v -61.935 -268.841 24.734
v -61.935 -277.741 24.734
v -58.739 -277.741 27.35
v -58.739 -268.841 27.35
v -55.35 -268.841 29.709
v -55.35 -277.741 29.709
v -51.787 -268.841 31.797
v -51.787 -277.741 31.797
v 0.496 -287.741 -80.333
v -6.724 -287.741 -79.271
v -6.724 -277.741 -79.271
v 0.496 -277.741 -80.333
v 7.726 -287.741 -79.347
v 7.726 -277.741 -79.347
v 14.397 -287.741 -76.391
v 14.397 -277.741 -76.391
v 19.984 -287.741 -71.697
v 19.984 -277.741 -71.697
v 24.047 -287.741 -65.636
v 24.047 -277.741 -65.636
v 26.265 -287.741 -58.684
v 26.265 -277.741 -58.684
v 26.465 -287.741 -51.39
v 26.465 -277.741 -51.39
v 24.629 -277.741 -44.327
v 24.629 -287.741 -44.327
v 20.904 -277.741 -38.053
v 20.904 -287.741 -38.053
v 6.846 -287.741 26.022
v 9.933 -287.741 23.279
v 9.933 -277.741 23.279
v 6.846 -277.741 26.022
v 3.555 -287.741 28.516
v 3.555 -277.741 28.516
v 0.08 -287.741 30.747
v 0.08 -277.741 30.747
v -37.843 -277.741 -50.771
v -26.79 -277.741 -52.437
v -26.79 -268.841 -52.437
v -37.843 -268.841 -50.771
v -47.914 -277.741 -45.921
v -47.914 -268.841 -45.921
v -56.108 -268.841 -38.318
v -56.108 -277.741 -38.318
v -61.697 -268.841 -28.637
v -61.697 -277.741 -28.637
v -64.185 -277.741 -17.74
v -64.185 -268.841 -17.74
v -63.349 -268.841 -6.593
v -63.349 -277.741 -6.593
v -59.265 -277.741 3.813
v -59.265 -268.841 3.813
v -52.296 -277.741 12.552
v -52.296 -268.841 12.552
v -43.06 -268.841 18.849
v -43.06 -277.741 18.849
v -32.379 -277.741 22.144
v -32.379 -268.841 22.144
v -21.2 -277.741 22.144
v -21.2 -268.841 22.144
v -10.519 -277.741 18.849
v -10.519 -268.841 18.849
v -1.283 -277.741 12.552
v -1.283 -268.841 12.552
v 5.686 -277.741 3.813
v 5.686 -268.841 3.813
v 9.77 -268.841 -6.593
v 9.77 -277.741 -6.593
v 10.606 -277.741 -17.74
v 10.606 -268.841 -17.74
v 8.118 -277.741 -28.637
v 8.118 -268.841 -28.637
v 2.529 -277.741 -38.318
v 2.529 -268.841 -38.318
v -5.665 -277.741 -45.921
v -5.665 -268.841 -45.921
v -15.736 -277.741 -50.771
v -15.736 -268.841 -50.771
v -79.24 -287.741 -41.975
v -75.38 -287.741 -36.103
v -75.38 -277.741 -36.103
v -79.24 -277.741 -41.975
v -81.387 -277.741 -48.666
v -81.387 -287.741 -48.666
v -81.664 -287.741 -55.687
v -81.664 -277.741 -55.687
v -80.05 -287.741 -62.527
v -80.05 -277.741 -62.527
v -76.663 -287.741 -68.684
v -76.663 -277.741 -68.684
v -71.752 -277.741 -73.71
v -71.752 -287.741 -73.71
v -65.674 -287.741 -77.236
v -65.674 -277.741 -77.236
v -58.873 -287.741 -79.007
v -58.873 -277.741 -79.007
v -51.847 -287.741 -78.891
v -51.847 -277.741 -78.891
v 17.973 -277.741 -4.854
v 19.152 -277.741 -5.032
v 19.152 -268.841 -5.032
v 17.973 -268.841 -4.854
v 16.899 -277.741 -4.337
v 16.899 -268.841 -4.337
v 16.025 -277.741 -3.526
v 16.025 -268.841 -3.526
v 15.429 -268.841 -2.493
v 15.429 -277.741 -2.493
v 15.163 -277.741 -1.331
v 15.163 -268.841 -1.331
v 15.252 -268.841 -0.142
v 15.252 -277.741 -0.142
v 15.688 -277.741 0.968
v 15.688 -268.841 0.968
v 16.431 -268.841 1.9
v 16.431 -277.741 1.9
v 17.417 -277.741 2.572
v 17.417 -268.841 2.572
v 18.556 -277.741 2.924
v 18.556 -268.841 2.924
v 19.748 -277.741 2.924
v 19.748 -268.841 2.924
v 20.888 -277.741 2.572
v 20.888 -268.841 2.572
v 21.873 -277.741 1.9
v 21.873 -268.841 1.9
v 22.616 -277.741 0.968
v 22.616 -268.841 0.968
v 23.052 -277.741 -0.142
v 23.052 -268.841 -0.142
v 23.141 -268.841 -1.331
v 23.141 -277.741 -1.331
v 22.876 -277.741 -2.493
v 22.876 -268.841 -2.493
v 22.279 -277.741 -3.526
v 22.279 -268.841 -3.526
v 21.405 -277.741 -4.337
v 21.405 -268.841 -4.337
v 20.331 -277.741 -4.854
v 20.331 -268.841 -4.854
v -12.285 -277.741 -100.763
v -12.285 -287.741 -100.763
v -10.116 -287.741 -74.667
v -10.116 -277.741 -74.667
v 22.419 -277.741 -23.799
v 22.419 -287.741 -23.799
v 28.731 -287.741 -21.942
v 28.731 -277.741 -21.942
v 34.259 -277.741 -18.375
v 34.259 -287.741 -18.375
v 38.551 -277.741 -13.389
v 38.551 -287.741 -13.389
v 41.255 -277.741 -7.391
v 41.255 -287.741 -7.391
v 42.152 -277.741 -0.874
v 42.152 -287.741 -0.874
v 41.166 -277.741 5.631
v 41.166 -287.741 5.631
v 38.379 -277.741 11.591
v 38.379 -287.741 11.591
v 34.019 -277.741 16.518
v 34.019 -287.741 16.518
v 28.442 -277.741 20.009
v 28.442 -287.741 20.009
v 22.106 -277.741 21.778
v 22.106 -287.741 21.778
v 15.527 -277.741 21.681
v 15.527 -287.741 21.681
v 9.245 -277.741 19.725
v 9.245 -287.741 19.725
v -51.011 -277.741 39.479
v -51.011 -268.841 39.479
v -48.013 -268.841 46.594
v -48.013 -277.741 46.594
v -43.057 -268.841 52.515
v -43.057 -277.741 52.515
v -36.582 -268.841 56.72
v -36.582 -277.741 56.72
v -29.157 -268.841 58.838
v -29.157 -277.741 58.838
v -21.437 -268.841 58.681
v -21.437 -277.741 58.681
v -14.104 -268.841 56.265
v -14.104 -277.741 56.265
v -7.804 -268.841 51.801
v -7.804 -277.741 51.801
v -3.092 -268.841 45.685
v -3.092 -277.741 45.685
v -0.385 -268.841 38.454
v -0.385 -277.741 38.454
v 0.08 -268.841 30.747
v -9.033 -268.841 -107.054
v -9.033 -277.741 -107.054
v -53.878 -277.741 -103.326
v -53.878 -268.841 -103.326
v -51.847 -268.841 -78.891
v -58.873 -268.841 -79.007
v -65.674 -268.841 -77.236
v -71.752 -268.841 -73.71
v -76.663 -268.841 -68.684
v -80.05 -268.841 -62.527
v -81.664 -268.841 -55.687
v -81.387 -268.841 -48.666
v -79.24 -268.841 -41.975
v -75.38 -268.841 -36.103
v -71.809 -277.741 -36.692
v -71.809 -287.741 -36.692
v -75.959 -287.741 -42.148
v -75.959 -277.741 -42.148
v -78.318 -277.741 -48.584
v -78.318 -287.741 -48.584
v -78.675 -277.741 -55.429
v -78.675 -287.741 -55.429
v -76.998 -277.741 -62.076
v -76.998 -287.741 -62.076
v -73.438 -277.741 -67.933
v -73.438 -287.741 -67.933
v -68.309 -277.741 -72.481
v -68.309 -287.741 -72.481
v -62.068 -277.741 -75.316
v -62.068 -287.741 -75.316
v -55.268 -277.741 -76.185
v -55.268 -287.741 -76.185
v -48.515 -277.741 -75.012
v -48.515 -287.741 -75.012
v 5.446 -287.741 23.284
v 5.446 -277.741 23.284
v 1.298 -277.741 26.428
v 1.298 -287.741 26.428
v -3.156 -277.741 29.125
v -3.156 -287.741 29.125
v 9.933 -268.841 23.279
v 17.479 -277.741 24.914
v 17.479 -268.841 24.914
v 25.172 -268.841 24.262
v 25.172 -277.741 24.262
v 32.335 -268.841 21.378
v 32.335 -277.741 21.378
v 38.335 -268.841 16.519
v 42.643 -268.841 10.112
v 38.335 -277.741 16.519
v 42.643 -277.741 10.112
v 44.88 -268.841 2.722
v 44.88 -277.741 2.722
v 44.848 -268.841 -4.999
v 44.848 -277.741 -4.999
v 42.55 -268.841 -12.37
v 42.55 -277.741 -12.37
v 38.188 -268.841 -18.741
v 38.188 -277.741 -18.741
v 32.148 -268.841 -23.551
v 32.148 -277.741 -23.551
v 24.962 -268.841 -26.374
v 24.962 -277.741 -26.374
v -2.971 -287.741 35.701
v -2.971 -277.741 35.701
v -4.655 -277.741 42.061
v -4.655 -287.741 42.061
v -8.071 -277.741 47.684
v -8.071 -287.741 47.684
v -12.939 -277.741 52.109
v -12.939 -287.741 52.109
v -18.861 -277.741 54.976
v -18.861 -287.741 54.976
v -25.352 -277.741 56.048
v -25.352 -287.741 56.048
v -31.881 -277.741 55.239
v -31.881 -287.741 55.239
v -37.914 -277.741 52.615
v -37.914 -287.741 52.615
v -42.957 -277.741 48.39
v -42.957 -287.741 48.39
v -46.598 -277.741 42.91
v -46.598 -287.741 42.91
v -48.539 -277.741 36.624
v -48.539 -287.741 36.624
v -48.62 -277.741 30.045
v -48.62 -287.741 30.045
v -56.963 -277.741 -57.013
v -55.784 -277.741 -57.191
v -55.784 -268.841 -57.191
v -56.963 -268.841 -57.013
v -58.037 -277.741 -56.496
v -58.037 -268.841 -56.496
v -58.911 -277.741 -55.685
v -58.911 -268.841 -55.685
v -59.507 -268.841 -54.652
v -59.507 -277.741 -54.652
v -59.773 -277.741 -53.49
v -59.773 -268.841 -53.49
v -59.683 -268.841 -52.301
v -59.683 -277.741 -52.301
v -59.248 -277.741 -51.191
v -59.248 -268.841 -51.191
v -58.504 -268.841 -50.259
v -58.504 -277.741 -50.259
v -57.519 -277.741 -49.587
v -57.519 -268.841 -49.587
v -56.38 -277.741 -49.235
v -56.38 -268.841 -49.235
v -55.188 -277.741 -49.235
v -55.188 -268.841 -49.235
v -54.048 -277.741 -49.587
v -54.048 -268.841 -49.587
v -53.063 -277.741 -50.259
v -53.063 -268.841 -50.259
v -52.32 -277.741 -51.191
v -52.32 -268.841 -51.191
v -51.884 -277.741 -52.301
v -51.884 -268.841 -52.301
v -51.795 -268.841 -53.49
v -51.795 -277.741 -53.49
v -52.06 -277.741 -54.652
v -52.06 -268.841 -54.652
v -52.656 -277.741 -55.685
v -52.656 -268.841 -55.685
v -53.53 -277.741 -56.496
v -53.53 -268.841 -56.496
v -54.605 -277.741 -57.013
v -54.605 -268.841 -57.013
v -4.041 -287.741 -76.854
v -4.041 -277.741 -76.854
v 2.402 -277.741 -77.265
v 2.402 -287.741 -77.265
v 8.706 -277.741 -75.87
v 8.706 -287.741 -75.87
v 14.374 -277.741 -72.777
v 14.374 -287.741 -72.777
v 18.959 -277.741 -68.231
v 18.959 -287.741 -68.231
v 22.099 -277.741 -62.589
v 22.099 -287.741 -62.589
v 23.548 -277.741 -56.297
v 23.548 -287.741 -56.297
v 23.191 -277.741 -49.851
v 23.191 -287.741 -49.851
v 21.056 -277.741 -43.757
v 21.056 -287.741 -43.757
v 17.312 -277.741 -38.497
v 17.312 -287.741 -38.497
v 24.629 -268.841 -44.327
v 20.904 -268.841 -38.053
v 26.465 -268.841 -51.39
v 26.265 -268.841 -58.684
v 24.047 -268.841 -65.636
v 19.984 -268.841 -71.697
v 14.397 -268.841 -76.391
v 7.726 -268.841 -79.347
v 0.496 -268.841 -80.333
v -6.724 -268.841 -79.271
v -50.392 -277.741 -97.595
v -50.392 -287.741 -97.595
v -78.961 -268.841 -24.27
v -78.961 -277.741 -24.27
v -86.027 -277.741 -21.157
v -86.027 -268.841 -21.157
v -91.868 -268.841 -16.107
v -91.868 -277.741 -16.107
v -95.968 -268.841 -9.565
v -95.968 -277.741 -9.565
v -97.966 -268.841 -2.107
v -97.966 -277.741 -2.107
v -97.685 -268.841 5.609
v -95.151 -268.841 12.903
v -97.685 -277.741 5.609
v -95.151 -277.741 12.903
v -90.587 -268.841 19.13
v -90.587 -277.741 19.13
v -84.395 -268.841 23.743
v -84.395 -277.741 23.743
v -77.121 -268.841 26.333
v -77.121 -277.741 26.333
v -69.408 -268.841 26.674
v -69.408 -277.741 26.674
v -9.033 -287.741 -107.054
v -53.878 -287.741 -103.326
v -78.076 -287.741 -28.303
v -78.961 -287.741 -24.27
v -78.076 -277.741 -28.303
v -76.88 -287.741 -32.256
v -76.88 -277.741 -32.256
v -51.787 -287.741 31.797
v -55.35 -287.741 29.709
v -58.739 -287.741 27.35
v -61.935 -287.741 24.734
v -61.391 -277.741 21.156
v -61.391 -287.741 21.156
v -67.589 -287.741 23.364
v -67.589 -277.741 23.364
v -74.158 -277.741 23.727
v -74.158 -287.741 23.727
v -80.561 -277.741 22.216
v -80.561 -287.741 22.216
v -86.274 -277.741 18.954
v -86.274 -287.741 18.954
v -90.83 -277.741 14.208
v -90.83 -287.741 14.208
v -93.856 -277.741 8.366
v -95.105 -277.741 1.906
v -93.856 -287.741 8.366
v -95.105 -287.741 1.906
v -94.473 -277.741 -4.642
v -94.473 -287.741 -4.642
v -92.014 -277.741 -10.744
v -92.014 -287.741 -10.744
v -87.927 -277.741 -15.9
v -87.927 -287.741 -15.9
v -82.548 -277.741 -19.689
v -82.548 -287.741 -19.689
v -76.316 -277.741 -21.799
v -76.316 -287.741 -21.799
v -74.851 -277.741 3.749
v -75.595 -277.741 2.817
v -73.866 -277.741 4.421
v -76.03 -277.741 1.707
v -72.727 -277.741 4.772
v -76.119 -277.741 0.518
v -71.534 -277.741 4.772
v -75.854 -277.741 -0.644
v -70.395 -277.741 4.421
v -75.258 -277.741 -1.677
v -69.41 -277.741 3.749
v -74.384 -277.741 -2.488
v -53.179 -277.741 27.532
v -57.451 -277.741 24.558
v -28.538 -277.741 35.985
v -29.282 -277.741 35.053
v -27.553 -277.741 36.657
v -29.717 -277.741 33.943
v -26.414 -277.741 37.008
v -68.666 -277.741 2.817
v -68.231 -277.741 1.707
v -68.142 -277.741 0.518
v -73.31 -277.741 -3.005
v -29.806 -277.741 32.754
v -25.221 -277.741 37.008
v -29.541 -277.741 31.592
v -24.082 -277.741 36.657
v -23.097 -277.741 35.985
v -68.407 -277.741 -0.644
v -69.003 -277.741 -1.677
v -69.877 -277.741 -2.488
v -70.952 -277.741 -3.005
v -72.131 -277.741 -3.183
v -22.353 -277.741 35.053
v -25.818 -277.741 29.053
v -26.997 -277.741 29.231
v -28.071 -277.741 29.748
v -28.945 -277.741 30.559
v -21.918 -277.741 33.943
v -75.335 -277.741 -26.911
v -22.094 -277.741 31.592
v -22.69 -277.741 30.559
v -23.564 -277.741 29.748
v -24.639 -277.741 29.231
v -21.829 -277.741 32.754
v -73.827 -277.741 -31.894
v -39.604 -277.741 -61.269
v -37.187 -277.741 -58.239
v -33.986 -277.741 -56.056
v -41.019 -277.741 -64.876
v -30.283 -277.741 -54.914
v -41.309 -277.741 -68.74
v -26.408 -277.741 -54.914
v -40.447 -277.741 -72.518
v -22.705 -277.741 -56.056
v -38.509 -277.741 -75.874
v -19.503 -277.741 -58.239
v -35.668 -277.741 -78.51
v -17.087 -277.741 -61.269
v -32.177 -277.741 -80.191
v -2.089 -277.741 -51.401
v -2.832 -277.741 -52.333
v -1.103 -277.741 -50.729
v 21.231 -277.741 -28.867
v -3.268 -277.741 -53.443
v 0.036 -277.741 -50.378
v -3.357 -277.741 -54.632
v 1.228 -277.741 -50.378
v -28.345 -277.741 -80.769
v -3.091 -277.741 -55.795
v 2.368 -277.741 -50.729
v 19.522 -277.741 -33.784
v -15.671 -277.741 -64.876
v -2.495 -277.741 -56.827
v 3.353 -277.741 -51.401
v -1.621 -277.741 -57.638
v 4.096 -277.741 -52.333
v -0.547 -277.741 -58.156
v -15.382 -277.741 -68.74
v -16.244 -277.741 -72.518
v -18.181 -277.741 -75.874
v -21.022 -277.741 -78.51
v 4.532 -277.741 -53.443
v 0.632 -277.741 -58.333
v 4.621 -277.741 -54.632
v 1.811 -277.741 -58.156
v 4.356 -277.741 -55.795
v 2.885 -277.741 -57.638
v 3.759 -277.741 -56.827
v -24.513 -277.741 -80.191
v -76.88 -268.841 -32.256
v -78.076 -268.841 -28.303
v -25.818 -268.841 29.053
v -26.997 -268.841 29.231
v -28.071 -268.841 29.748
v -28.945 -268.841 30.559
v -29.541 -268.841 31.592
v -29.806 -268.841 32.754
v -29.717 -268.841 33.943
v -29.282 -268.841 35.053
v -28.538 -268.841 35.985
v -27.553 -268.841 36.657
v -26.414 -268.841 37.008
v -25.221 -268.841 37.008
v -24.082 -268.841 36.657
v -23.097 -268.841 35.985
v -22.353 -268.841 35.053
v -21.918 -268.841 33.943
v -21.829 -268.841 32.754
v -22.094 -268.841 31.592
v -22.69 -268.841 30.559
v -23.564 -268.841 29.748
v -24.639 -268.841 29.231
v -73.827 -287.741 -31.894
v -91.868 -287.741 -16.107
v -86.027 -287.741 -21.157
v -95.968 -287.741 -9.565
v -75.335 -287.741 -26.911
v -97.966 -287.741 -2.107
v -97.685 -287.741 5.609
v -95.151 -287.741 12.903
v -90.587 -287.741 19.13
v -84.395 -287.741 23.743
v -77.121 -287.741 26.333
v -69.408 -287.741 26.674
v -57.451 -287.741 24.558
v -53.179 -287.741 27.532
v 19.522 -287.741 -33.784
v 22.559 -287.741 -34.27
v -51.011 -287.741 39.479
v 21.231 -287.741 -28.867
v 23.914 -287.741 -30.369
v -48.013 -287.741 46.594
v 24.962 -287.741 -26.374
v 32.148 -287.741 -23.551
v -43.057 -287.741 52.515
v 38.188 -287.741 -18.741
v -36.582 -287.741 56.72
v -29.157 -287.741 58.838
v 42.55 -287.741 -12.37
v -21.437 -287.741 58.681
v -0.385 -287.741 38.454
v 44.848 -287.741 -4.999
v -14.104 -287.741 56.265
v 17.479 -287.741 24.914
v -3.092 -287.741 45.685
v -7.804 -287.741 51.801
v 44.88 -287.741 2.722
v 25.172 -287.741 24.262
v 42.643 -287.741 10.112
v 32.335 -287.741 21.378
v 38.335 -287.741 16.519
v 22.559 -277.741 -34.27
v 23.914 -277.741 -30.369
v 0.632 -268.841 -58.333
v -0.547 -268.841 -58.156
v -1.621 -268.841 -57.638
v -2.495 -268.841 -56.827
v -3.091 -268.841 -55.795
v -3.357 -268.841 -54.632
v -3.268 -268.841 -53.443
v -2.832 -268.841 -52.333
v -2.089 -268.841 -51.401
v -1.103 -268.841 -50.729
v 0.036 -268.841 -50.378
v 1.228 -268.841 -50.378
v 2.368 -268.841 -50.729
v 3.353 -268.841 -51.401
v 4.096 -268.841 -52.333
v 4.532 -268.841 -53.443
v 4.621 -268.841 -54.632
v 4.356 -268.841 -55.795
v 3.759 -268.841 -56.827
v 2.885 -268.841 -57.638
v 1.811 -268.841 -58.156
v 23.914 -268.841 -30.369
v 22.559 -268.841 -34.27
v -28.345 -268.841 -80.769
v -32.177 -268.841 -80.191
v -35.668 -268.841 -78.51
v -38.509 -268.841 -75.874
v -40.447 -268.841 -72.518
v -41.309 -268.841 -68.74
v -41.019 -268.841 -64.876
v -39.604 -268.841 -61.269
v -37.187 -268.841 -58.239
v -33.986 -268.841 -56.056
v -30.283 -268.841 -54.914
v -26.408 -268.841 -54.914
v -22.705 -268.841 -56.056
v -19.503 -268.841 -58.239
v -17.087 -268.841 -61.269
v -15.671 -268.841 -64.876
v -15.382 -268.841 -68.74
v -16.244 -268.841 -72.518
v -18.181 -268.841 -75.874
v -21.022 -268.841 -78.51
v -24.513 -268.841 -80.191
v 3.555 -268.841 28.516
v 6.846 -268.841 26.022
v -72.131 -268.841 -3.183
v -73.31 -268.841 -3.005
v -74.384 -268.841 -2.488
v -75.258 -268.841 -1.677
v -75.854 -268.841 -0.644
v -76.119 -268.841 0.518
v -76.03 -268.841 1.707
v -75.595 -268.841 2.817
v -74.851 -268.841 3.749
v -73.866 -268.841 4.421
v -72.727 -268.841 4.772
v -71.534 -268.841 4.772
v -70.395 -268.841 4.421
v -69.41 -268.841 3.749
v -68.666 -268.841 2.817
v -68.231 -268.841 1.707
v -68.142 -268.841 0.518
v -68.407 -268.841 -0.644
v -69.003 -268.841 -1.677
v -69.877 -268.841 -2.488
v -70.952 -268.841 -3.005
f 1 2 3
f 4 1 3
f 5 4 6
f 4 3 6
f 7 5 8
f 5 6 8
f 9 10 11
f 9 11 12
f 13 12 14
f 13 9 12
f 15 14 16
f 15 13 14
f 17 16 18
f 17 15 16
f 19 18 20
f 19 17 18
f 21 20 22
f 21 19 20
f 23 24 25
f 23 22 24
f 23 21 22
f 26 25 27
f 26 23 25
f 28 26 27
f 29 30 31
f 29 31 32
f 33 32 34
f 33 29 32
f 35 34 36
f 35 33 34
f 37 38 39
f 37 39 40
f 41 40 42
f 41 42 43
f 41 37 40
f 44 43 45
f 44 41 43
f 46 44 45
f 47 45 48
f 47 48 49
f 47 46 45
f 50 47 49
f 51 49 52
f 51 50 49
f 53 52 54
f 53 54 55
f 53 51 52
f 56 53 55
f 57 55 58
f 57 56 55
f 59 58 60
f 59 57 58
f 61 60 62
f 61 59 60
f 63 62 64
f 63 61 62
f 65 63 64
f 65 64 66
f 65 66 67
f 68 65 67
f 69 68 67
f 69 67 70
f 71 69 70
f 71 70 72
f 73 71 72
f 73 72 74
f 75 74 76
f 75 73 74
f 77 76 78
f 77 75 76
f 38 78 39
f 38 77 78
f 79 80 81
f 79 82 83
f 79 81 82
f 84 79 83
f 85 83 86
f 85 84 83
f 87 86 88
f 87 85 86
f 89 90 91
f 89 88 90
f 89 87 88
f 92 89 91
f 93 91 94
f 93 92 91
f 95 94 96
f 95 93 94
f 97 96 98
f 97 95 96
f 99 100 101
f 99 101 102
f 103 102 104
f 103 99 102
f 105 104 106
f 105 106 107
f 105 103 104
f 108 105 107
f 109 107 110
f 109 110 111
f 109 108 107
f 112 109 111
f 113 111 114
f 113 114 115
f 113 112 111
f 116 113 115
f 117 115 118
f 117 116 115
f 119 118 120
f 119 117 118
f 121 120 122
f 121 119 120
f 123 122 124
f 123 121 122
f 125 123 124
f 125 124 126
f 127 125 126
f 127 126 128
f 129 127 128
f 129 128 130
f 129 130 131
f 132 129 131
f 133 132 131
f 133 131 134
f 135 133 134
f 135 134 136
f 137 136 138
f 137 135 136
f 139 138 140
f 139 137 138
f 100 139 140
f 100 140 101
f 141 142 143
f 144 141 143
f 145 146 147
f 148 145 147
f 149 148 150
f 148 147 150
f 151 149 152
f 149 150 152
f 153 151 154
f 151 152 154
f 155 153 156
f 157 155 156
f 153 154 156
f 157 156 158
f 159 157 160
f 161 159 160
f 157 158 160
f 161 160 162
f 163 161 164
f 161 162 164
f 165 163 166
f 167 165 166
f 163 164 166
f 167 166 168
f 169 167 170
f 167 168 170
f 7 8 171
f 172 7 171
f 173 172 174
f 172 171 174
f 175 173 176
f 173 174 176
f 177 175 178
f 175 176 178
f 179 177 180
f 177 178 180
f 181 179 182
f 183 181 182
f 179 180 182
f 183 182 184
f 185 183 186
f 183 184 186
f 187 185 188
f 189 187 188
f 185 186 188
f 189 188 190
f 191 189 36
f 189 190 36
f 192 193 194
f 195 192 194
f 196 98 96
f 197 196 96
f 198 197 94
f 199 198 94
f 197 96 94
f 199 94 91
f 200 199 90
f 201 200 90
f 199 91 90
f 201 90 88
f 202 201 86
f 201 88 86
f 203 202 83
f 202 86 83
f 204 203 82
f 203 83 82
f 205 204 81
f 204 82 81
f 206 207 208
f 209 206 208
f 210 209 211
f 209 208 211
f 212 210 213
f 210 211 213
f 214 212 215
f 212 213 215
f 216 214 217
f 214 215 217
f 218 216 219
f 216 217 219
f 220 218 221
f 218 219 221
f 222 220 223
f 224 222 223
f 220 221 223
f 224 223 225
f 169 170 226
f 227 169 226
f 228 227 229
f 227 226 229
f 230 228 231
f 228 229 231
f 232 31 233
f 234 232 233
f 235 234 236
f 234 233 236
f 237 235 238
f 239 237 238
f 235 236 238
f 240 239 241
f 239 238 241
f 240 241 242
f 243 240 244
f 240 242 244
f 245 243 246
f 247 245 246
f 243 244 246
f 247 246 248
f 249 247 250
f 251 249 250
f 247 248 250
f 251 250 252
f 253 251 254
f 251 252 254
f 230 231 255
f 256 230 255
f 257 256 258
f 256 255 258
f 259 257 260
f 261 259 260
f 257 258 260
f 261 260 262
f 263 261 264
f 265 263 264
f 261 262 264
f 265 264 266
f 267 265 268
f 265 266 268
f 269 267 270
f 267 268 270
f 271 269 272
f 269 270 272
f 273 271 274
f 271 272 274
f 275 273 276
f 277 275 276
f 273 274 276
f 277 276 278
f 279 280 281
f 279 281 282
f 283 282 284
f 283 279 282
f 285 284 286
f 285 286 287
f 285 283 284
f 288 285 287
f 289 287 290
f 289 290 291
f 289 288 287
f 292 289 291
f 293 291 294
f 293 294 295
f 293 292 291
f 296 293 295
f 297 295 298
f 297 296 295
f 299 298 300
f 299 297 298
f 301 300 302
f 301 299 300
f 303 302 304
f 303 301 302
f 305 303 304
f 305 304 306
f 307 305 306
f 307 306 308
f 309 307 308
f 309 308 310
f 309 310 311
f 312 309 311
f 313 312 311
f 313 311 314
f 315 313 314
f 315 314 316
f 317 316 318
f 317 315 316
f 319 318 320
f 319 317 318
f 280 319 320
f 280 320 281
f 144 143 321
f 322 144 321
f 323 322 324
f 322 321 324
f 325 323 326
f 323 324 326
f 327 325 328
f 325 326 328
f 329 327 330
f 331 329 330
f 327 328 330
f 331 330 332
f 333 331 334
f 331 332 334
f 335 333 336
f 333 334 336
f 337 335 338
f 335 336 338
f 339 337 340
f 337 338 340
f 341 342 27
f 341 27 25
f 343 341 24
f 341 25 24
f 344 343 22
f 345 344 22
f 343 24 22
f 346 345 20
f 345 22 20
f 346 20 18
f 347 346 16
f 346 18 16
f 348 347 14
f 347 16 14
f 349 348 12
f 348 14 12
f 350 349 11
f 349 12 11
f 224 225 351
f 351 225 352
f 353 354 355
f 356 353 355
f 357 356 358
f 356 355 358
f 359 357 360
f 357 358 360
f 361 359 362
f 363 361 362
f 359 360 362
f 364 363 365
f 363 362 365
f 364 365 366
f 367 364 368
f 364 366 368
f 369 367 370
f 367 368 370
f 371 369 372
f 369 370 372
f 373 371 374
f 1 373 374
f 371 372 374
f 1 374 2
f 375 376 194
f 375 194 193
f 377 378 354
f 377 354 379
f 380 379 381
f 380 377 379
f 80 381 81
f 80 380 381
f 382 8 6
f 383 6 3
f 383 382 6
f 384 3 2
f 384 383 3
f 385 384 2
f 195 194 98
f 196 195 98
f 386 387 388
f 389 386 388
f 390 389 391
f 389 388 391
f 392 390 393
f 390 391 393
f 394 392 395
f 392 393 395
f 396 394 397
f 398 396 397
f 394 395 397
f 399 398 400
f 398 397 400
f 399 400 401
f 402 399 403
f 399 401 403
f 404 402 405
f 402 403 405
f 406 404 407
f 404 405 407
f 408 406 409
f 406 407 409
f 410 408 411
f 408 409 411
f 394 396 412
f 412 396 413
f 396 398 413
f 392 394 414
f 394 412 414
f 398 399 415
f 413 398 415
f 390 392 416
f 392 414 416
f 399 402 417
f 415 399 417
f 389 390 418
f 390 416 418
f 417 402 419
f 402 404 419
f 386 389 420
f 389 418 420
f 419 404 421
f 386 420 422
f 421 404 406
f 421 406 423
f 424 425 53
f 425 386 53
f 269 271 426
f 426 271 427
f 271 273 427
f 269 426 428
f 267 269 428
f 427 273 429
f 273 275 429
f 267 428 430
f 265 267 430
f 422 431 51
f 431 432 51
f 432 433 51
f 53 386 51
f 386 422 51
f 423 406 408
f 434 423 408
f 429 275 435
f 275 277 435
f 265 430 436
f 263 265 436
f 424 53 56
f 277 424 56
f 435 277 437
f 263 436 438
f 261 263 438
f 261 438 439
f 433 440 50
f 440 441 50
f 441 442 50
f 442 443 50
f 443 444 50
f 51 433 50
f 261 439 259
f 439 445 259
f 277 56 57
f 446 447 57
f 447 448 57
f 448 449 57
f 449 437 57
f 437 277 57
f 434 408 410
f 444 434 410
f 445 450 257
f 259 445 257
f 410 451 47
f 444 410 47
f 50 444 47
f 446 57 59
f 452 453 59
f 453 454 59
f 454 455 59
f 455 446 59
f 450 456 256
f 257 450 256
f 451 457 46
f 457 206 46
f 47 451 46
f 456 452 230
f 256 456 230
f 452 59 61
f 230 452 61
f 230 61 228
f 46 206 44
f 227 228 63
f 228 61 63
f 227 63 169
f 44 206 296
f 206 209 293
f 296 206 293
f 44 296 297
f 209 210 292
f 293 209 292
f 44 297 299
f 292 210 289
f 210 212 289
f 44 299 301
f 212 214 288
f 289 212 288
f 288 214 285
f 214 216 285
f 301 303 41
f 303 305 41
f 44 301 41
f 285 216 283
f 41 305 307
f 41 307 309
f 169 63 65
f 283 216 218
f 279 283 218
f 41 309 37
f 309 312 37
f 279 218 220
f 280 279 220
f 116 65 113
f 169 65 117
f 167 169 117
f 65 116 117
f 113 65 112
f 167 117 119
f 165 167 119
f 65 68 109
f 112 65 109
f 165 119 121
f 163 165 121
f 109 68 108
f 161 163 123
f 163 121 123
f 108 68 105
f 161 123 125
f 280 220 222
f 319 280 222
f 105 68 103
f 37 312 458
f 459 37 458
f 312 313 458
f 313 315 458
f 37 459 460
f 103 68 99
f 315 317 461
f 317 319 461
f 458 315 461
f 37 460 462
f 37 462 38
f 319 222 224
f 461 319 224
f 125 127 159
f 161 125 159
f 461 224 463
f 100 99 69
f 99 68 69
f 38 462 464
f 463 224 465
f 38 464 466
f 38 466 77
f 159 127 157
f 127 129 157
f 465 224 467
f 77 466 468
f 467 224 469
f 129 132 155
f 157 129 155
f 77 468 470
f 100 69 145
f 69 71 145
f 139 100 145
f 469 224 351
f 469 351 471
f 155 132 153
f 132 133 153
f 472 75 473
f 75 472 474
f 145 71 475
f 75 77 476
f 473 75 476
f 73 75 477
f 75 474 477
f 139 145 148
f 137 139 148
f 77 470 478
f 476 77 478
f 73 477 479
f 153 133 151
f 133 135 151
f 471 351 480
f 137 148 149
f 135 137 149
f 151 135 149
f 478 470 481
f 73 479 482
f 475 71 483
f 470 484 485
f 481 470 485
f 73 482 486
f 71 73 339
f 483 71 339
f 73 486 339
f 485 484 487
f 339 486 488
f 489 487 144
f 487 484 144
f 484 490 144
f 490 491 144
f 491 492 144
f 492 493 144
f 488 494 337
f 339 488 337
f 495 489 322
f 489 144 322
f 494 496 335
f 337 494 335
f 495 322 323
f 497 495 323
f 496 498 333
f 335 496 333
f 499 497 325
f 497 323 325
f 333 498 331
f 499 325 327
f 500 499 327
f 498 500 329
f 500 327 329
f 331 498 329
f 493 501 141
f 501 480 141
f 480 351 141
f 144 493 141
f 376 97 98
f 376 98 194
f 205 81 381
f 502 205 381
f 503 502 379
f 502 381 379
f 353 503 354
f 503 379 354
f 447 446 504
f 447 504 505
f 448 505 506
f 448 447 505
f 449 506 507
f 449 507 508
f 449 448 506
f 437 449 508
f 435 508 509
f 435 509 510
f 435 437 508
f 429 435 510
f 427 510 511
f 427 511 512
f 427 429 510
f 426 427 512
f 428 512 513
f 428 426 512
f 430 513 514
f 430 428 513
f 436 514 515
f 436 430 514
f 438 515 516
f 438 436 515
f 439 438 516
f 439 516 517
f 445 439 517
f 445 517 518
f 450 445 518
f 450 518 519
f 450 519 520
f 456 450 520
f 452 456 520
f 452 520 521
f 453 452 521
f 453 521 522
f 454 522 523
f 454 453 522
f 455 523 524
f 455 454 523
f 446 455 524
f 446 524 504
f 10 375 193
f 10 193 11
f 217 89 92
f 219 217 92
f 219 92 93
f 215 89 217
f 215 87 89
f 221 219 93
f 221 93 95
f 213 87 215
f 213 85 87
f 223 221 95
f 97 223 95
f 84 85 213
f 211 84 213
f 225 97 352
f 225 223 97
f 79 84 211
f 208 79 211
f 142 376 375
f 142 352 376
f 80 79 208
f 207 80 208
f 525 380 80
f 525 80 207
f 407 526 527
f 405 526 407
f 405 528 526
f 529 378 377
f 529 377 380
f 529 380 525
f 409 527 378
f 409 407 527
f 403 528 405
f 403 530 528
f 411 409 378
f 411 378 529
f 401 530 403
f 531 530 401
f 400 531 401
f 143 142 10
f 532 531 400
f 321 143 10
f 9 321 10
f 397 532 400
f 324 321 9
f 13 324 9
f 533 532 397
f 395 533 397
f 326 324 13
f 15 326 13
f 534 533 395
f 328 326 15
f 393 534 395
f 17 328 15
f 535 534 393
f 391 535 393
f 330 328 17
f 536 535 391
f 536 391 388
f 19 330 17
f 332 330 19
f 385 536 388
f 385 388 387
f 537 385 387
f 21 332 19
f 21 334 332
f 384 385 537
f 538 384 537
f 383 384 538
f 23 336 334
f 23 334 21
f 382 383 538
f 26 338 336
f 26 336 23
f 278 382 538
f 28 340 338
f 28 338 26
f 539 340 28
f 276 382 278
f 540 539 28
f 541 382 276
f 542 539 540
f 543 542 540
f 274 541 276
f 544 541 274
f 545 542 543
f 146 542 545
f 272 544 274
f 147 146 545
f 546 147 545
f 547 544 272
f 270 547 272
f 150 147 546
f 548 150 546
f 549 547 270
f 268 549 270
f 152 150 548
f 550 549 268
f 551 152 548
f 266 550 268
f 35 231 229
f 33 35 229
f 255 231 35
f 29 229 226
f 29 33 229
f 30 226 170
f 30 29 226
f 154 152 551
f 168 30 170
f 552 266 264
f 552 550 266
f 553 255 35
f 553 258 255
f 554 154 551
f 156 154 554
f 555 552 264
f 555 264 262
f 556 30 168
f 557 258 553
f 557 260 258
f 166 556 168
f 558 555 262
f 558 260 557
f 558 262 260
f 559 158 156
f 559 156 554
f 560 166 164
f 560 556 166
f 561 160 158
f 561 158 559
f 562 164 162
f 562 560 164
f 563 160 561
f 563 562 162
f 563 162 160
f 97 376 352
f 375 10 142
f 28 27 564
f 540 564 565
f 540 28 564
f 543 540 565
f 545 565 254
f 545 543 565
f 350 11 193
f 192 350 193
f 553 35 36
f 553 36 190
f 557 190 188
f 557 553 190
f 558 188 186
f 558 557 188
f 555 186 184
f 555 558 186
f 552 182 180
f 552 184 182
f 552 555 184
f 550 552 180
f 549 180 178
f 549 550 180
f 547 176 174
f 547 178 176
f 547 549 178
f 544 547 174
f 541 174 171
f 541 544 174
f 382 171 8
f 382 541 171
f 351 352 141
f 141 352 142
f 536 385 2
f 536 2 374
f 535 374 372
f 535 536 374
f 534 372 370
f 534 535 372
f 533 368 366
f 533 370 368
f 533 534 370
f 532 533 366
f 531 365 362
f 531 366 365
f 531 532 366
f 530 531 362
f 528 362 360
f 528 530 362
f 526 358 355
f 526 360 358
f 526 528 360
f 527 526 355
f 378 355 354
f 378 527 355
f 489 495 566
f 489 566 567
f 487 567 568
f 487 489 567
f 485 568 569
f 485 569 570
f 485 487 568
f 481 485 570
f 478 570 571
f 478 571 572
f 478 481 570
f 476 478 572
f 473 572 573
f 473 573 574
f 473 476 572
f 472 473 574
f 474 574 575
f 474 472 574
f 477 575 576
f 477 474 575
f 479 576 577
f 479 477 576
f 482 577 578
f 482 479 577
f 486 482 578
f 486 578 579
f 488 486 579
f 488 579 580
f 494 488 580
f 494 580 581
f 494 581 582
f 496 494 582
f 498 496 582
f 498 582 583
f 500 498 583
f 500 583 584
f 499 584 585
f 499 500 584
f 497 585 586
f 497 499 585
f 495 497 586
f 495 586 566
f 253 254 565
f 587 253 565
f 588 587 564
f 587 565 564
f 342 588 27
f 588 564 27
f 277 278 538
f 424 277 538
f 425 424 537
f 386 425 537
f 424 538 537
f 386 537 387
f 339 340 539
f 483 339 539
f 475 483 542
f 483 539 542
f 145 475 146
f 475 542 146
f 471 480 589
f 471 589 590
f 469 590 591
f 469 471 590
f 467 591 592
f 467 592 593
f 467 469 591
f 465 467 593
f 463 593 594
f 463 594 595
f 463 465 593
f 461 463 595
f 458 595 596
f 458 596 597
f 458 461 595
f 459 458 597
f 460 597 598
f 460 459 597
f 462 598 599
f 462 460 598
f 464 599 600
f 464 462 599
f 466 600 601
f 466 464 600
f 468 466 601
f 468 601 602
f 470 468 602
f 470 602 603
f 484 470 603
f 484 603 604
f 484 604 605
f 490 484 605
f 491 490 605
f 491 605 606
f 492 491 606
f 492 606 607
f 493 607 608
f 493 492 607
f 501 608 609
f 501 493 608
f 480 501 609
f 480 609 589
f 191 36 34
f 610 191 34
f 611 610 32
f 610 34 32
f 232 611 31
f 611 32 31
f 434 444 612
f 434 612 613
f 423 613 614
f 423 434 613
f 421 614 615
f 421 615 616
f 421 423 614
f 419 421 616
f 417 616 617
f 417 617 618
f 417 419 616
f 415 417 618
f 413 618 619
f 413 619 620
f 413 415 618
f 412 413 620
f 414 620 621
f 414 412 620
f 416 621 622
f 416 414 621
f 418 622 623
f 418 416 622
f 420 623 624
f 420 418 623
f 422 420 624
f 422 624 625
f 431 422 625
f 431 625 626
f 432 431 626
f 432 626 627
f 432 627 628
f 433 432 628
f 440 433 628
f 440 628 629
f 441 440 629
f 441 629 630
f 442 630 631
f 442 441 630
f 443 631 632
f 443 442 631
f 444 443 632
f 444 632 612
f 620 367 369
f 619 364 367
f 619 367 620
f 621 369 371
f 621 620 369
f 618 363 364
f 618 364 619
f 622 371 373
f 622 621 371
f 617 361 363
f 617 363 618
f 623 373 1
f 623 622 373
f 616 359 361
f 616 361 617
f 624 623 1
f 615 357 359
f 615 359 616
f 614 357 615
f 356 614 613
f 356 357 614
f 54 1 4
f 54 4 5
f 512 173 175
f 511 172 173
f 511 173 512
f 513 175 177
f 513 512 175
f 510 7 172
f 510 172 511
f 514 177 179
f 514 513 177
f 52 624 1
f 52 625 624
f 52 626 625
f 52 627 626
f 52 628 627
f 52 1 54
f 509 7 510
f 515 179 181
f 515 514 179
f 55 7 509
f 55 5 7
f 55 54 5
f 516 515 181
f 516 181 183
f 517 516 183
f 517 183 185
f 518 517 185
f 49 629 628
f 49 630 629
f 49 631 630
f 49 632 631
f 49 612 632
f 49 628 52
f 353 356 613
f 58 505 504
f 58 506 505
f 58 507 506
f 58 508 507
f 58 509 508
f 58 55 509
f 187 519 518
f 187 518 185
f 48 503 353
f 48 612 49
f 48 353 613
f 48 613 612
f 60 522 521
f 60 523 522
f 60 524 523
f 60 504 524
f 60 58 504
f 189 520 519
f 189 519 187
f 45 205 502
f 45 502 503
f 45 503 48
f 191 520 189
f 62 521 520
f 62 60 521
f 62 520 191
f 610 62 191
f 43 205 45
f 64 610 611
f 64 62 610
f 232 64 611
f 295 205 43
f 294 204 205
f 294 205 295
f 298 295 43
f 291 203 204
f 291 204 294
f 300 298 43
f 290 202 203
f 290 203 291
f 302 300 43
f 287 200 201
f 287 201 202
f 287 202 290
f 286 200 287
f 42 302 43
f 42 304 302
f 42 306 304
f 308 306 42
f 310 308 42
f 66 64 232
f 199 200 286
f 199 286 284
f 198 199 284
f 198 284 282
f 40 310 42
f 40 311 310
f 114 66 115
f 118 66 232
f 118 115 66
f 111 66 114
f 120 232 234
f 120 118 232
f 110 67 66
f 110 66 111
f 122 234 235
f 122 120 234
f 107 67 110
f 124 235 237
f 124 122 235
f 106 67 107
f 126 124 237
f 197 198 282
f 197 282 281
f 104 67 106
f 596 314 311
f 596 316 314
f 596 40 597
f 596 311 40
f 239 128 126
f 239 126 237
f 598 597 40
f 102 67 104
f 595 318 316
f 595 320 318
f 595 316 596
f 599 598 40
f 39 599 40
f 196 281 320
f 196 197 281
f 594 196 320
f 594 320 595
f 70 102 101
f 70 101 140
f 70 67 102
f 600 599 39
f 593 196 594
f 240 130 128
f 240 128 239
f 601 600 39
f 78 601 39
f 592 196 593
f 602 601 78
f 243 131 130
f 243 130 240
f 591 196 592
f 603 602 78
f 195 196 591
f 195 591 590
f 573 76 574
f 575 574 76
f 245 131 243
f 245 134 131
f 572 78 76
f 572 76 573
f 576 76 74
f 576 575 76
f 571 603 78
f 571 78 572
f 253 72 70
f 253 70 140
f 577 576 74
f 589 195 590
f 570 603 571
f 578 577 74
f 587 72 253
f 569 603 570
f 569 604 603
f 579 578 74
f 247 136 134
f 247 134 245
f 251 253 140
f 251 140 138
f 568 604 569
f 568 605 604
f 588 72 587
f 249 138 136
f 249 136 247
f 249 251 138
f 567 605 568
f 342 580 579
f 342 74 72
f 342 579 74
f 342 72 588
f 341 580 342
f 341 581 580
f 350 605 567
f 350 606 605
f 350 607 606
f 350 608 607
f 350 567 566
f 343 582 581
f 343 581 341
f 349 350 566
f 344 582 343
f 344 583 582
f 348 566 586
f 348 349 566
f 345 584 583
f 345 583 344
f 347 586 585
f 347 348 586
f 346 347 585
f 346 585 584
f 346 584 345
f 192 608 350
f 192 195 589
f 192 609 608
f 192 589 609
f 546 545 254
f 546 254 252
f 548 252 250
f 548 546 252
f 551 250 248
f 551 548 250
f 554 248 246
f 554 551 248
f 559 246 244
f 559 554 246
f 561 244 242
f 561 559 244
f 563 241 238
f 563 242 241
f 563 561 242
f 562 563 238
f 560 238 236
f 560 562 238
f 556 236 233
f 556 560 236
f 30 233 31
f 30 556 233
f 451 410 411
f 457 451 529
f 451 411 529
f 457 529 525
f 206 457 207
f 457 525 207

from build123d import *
from build123d.topology import SkipClean

# Parameters (mm, degrees)
SKETCH2_R           = 4
SKETCH2_R_2         = 13
SKETCH2_R_3         = 37.5
BOSS_EXTRUDE1_DEPTH = 8.9
BOSS_EXTRUDE2_START = 10
BOSS_EXTRUDE2_DEPTH = 10


with BuildPart() as part:
    # Sketch2 → Boss-Extrude1 (new body)
    with BuildSketch(Plane(origin=(0, -277.740590487, 0), x_dir=(1, 0, 0), z_dir=(0, 1, 0))):
        with BuildLine():
            Line((-53.878418828, 103.326067531), (-51.847327573, 78.891037586))
            ThreePointArc((-51.847327573, 78.891037586), (-78.565598454, 65.720224595), (-75.379791117, 36.102882626))
            ThreePointArc((-75.379791117, 36.102882626), (-77.51682206, 30.291074957), (-78.961404494, 24.269680499))
            ThreePointArc((-78.961404494, 24.269680499), (-96.690244613, -9.350450792), (-61.934509278, -24.73433396))
            ThreePointArc((-61.934509278, -24.73433396), (-57.067530602, -28.562718501), (-51.787244687, -31.797311256))
            ThreePointArc((-51.787244687, -31.797311256), (-25.291112632, -59.0476321), (0.079942571, -30.746844869))
            ThreePointArc((0.079942571, -30.746844869), (5.224931759, -27.301108969), (9.932910358, -23.278802773))
            ThreePointArc((9.932910358, -23.278802773), (44.037260658, -6.500295968), (24.961699769, 26.374435617))
            ThreePointArc((24.961699769, 26.374435617), (23.274499283, 32.332402061), (20.903904161, 38.052916758))
            ThreePointArc((20.903904161, 38.052916758), (22.229306824, 68.809494643), (-6.72372905, 79.271114455))
            Line((-6.72372905, 79.271114455), (-9.033076774, 107.053707002))
            Line((-9.033076774, 107.053707002), (-53.878418828, 103.326067531))
        make_face()
        with Locations(Location((-55.783755129, 53.190754745, 0), (0, 0, 90))):
            Circle(SKETCH2_R, mode=Mode.SUBTRACT)
        with Locations(Location((0.632059839, 54.33334451, 0), (0, 0, 90))):
            Circle(SKETCH2_R, mode=Mode.SUBTRACT)
        with Locations(Location((19.152172858, 1.031795718, 0), (0, 0, 90))):
            Circle(SKETCH2_R, mode=Mode.SUBTRACT)
        with Locations(Location((-25.81758279, -33.052962854, 0), (0, 0, 90))):
            Circle(SKETCH2_R, mode=Mode.SUBTRACT)
        with Locations(Location((-72.130533264, -0.816953357, 0), (0, 0, 90))):
            Circle(SKETCH2_R, mode=Mode.SUBTRACT)
        with Locations(Location((-28.345239753, 67.76894073, 0), (0, 0, 90))):
            Circle(SKETCH2_R_2, mode=Mode.SUBTRACT)
        with Locations(Location((-26.789527697, 14.937195752, 0), (0, 0, 90))):
            Circle(SKETCH2_R_3, mode=Mode.SUBTRACT)
    extrude(amount=BOSS_EXTRUDE1_DEPTH)

    # Sketch3 → Boss-Extrude2 (add)
    with SkipClean():  # the faces are left unmerged after this step: merging them gives an invalid solid
        with BuildSketch(Plane.XZ.offset(277.740590487).offset(BOSS_EXTRUDE2_START)):
            with BuildLine():
                Line((-51.847327573, -78.891037586), (-53.878418828, -103.326067531))
                Line((-53.878418828, -103.326067531), (-9.033076774, -107.053707002))
                Line((-9.033076774, -107.053707002), (-6.72372905, -79.271114455))
                ThreePointArc((-6.72372905, -79.271114455), (22.229306824, -68.809494643), (20.903904161, -38.052916758))
                ThreePointArc((20.903904161, -38.052916758), (23.274499283, -32.332402061), (24.961699769, -26.374435617))
                ThreePointArc((24.961699769, -26.374435617), (44.037260658, 6.500295968), (9.932910358, 23.278802773))
                ThreePointArc((9.932910358, 23.278802773), (5.224931759, 27.301108969), (0.079942571, 30.746844869))
                ThreePointArc((0.079942571, 30.746844869), (-25.291112632, 59.0476321), (-51.787244687, 31.797311256))
                ThreePointArc((-51.787244687, 31.797311256), (-57.067530602, 28.562718501), (-61.934509278, 24.73433396))
                ThreePointArc((-61.934509278, 24.73433396), (-96.690244613, 9.350450792), (-78.961404494, -24.269680499))
                ThreePointArc((-78.961404494, -24.269680499), (-77.51682206, -30.291074957), (-75.379791117, -36.102882626))
                ThreePointArc((-75.379791117, -36.102882626), (-78.565598454, -65.720224595), (-51.847327573, -78.891037586))
            make_face()
            with BuildLine():
                Line((-50.391710762, -97.595197888), (-12.285492603, -100.76266716))
                Line((-12.285492603, -100.76266716), (-10.116392703, -74.667325133))
                ThreePointArc((-10.116392703, -74.667325133), (18.958700221, -68.230619507), (17.311823606, -38.49713661))
                ThreePointArc((17.311823606, -38.49713661), (20.440686435, -31.347767742), (22.418959701, -23.798615955))
                ThreePointArc((22.418959701, -23.798615955), (41.165904374, 5.631208466), (9.245374606, 19.725259671))
                ThreePointArc((9.245374606, 19.725259671), (3.412792544, 24.910261532), (-3.155557396, 29.124527408))
                ThreePointArc((-3.155557396, 29.124527408), (-25.351859189, 56.048247187), (-48.620084596, 30.04532069))
                ThreePointArc((-48.620084596, 30.04532069), (-55.353681381, 26.100459204), (-61.39141816, 21.155866966))
                ThreePointArc((-61.39141816, 21.155866966), (-93.856431765, 8.365816472), (-76.316456157, -21.798927115))
                ThreePointArc((-76.316456157, -21.798927115), (-74.645465775, -29.421987455), (-71.808642379, -36.692179394))
                ThreePointArc((-71.808642379, -36.692179394), (-75.437352981, -65.137975823), (-48.514531786, -75.011808615))
                Line((-48.514531786, -75.011808615), (-50.391710762, -97.595197888))
            make_face(mode=Mode.SUBTRACT)
        extrude(amount=-BOSS_EXTRUDE2_DEPTH)


solid = part.part
